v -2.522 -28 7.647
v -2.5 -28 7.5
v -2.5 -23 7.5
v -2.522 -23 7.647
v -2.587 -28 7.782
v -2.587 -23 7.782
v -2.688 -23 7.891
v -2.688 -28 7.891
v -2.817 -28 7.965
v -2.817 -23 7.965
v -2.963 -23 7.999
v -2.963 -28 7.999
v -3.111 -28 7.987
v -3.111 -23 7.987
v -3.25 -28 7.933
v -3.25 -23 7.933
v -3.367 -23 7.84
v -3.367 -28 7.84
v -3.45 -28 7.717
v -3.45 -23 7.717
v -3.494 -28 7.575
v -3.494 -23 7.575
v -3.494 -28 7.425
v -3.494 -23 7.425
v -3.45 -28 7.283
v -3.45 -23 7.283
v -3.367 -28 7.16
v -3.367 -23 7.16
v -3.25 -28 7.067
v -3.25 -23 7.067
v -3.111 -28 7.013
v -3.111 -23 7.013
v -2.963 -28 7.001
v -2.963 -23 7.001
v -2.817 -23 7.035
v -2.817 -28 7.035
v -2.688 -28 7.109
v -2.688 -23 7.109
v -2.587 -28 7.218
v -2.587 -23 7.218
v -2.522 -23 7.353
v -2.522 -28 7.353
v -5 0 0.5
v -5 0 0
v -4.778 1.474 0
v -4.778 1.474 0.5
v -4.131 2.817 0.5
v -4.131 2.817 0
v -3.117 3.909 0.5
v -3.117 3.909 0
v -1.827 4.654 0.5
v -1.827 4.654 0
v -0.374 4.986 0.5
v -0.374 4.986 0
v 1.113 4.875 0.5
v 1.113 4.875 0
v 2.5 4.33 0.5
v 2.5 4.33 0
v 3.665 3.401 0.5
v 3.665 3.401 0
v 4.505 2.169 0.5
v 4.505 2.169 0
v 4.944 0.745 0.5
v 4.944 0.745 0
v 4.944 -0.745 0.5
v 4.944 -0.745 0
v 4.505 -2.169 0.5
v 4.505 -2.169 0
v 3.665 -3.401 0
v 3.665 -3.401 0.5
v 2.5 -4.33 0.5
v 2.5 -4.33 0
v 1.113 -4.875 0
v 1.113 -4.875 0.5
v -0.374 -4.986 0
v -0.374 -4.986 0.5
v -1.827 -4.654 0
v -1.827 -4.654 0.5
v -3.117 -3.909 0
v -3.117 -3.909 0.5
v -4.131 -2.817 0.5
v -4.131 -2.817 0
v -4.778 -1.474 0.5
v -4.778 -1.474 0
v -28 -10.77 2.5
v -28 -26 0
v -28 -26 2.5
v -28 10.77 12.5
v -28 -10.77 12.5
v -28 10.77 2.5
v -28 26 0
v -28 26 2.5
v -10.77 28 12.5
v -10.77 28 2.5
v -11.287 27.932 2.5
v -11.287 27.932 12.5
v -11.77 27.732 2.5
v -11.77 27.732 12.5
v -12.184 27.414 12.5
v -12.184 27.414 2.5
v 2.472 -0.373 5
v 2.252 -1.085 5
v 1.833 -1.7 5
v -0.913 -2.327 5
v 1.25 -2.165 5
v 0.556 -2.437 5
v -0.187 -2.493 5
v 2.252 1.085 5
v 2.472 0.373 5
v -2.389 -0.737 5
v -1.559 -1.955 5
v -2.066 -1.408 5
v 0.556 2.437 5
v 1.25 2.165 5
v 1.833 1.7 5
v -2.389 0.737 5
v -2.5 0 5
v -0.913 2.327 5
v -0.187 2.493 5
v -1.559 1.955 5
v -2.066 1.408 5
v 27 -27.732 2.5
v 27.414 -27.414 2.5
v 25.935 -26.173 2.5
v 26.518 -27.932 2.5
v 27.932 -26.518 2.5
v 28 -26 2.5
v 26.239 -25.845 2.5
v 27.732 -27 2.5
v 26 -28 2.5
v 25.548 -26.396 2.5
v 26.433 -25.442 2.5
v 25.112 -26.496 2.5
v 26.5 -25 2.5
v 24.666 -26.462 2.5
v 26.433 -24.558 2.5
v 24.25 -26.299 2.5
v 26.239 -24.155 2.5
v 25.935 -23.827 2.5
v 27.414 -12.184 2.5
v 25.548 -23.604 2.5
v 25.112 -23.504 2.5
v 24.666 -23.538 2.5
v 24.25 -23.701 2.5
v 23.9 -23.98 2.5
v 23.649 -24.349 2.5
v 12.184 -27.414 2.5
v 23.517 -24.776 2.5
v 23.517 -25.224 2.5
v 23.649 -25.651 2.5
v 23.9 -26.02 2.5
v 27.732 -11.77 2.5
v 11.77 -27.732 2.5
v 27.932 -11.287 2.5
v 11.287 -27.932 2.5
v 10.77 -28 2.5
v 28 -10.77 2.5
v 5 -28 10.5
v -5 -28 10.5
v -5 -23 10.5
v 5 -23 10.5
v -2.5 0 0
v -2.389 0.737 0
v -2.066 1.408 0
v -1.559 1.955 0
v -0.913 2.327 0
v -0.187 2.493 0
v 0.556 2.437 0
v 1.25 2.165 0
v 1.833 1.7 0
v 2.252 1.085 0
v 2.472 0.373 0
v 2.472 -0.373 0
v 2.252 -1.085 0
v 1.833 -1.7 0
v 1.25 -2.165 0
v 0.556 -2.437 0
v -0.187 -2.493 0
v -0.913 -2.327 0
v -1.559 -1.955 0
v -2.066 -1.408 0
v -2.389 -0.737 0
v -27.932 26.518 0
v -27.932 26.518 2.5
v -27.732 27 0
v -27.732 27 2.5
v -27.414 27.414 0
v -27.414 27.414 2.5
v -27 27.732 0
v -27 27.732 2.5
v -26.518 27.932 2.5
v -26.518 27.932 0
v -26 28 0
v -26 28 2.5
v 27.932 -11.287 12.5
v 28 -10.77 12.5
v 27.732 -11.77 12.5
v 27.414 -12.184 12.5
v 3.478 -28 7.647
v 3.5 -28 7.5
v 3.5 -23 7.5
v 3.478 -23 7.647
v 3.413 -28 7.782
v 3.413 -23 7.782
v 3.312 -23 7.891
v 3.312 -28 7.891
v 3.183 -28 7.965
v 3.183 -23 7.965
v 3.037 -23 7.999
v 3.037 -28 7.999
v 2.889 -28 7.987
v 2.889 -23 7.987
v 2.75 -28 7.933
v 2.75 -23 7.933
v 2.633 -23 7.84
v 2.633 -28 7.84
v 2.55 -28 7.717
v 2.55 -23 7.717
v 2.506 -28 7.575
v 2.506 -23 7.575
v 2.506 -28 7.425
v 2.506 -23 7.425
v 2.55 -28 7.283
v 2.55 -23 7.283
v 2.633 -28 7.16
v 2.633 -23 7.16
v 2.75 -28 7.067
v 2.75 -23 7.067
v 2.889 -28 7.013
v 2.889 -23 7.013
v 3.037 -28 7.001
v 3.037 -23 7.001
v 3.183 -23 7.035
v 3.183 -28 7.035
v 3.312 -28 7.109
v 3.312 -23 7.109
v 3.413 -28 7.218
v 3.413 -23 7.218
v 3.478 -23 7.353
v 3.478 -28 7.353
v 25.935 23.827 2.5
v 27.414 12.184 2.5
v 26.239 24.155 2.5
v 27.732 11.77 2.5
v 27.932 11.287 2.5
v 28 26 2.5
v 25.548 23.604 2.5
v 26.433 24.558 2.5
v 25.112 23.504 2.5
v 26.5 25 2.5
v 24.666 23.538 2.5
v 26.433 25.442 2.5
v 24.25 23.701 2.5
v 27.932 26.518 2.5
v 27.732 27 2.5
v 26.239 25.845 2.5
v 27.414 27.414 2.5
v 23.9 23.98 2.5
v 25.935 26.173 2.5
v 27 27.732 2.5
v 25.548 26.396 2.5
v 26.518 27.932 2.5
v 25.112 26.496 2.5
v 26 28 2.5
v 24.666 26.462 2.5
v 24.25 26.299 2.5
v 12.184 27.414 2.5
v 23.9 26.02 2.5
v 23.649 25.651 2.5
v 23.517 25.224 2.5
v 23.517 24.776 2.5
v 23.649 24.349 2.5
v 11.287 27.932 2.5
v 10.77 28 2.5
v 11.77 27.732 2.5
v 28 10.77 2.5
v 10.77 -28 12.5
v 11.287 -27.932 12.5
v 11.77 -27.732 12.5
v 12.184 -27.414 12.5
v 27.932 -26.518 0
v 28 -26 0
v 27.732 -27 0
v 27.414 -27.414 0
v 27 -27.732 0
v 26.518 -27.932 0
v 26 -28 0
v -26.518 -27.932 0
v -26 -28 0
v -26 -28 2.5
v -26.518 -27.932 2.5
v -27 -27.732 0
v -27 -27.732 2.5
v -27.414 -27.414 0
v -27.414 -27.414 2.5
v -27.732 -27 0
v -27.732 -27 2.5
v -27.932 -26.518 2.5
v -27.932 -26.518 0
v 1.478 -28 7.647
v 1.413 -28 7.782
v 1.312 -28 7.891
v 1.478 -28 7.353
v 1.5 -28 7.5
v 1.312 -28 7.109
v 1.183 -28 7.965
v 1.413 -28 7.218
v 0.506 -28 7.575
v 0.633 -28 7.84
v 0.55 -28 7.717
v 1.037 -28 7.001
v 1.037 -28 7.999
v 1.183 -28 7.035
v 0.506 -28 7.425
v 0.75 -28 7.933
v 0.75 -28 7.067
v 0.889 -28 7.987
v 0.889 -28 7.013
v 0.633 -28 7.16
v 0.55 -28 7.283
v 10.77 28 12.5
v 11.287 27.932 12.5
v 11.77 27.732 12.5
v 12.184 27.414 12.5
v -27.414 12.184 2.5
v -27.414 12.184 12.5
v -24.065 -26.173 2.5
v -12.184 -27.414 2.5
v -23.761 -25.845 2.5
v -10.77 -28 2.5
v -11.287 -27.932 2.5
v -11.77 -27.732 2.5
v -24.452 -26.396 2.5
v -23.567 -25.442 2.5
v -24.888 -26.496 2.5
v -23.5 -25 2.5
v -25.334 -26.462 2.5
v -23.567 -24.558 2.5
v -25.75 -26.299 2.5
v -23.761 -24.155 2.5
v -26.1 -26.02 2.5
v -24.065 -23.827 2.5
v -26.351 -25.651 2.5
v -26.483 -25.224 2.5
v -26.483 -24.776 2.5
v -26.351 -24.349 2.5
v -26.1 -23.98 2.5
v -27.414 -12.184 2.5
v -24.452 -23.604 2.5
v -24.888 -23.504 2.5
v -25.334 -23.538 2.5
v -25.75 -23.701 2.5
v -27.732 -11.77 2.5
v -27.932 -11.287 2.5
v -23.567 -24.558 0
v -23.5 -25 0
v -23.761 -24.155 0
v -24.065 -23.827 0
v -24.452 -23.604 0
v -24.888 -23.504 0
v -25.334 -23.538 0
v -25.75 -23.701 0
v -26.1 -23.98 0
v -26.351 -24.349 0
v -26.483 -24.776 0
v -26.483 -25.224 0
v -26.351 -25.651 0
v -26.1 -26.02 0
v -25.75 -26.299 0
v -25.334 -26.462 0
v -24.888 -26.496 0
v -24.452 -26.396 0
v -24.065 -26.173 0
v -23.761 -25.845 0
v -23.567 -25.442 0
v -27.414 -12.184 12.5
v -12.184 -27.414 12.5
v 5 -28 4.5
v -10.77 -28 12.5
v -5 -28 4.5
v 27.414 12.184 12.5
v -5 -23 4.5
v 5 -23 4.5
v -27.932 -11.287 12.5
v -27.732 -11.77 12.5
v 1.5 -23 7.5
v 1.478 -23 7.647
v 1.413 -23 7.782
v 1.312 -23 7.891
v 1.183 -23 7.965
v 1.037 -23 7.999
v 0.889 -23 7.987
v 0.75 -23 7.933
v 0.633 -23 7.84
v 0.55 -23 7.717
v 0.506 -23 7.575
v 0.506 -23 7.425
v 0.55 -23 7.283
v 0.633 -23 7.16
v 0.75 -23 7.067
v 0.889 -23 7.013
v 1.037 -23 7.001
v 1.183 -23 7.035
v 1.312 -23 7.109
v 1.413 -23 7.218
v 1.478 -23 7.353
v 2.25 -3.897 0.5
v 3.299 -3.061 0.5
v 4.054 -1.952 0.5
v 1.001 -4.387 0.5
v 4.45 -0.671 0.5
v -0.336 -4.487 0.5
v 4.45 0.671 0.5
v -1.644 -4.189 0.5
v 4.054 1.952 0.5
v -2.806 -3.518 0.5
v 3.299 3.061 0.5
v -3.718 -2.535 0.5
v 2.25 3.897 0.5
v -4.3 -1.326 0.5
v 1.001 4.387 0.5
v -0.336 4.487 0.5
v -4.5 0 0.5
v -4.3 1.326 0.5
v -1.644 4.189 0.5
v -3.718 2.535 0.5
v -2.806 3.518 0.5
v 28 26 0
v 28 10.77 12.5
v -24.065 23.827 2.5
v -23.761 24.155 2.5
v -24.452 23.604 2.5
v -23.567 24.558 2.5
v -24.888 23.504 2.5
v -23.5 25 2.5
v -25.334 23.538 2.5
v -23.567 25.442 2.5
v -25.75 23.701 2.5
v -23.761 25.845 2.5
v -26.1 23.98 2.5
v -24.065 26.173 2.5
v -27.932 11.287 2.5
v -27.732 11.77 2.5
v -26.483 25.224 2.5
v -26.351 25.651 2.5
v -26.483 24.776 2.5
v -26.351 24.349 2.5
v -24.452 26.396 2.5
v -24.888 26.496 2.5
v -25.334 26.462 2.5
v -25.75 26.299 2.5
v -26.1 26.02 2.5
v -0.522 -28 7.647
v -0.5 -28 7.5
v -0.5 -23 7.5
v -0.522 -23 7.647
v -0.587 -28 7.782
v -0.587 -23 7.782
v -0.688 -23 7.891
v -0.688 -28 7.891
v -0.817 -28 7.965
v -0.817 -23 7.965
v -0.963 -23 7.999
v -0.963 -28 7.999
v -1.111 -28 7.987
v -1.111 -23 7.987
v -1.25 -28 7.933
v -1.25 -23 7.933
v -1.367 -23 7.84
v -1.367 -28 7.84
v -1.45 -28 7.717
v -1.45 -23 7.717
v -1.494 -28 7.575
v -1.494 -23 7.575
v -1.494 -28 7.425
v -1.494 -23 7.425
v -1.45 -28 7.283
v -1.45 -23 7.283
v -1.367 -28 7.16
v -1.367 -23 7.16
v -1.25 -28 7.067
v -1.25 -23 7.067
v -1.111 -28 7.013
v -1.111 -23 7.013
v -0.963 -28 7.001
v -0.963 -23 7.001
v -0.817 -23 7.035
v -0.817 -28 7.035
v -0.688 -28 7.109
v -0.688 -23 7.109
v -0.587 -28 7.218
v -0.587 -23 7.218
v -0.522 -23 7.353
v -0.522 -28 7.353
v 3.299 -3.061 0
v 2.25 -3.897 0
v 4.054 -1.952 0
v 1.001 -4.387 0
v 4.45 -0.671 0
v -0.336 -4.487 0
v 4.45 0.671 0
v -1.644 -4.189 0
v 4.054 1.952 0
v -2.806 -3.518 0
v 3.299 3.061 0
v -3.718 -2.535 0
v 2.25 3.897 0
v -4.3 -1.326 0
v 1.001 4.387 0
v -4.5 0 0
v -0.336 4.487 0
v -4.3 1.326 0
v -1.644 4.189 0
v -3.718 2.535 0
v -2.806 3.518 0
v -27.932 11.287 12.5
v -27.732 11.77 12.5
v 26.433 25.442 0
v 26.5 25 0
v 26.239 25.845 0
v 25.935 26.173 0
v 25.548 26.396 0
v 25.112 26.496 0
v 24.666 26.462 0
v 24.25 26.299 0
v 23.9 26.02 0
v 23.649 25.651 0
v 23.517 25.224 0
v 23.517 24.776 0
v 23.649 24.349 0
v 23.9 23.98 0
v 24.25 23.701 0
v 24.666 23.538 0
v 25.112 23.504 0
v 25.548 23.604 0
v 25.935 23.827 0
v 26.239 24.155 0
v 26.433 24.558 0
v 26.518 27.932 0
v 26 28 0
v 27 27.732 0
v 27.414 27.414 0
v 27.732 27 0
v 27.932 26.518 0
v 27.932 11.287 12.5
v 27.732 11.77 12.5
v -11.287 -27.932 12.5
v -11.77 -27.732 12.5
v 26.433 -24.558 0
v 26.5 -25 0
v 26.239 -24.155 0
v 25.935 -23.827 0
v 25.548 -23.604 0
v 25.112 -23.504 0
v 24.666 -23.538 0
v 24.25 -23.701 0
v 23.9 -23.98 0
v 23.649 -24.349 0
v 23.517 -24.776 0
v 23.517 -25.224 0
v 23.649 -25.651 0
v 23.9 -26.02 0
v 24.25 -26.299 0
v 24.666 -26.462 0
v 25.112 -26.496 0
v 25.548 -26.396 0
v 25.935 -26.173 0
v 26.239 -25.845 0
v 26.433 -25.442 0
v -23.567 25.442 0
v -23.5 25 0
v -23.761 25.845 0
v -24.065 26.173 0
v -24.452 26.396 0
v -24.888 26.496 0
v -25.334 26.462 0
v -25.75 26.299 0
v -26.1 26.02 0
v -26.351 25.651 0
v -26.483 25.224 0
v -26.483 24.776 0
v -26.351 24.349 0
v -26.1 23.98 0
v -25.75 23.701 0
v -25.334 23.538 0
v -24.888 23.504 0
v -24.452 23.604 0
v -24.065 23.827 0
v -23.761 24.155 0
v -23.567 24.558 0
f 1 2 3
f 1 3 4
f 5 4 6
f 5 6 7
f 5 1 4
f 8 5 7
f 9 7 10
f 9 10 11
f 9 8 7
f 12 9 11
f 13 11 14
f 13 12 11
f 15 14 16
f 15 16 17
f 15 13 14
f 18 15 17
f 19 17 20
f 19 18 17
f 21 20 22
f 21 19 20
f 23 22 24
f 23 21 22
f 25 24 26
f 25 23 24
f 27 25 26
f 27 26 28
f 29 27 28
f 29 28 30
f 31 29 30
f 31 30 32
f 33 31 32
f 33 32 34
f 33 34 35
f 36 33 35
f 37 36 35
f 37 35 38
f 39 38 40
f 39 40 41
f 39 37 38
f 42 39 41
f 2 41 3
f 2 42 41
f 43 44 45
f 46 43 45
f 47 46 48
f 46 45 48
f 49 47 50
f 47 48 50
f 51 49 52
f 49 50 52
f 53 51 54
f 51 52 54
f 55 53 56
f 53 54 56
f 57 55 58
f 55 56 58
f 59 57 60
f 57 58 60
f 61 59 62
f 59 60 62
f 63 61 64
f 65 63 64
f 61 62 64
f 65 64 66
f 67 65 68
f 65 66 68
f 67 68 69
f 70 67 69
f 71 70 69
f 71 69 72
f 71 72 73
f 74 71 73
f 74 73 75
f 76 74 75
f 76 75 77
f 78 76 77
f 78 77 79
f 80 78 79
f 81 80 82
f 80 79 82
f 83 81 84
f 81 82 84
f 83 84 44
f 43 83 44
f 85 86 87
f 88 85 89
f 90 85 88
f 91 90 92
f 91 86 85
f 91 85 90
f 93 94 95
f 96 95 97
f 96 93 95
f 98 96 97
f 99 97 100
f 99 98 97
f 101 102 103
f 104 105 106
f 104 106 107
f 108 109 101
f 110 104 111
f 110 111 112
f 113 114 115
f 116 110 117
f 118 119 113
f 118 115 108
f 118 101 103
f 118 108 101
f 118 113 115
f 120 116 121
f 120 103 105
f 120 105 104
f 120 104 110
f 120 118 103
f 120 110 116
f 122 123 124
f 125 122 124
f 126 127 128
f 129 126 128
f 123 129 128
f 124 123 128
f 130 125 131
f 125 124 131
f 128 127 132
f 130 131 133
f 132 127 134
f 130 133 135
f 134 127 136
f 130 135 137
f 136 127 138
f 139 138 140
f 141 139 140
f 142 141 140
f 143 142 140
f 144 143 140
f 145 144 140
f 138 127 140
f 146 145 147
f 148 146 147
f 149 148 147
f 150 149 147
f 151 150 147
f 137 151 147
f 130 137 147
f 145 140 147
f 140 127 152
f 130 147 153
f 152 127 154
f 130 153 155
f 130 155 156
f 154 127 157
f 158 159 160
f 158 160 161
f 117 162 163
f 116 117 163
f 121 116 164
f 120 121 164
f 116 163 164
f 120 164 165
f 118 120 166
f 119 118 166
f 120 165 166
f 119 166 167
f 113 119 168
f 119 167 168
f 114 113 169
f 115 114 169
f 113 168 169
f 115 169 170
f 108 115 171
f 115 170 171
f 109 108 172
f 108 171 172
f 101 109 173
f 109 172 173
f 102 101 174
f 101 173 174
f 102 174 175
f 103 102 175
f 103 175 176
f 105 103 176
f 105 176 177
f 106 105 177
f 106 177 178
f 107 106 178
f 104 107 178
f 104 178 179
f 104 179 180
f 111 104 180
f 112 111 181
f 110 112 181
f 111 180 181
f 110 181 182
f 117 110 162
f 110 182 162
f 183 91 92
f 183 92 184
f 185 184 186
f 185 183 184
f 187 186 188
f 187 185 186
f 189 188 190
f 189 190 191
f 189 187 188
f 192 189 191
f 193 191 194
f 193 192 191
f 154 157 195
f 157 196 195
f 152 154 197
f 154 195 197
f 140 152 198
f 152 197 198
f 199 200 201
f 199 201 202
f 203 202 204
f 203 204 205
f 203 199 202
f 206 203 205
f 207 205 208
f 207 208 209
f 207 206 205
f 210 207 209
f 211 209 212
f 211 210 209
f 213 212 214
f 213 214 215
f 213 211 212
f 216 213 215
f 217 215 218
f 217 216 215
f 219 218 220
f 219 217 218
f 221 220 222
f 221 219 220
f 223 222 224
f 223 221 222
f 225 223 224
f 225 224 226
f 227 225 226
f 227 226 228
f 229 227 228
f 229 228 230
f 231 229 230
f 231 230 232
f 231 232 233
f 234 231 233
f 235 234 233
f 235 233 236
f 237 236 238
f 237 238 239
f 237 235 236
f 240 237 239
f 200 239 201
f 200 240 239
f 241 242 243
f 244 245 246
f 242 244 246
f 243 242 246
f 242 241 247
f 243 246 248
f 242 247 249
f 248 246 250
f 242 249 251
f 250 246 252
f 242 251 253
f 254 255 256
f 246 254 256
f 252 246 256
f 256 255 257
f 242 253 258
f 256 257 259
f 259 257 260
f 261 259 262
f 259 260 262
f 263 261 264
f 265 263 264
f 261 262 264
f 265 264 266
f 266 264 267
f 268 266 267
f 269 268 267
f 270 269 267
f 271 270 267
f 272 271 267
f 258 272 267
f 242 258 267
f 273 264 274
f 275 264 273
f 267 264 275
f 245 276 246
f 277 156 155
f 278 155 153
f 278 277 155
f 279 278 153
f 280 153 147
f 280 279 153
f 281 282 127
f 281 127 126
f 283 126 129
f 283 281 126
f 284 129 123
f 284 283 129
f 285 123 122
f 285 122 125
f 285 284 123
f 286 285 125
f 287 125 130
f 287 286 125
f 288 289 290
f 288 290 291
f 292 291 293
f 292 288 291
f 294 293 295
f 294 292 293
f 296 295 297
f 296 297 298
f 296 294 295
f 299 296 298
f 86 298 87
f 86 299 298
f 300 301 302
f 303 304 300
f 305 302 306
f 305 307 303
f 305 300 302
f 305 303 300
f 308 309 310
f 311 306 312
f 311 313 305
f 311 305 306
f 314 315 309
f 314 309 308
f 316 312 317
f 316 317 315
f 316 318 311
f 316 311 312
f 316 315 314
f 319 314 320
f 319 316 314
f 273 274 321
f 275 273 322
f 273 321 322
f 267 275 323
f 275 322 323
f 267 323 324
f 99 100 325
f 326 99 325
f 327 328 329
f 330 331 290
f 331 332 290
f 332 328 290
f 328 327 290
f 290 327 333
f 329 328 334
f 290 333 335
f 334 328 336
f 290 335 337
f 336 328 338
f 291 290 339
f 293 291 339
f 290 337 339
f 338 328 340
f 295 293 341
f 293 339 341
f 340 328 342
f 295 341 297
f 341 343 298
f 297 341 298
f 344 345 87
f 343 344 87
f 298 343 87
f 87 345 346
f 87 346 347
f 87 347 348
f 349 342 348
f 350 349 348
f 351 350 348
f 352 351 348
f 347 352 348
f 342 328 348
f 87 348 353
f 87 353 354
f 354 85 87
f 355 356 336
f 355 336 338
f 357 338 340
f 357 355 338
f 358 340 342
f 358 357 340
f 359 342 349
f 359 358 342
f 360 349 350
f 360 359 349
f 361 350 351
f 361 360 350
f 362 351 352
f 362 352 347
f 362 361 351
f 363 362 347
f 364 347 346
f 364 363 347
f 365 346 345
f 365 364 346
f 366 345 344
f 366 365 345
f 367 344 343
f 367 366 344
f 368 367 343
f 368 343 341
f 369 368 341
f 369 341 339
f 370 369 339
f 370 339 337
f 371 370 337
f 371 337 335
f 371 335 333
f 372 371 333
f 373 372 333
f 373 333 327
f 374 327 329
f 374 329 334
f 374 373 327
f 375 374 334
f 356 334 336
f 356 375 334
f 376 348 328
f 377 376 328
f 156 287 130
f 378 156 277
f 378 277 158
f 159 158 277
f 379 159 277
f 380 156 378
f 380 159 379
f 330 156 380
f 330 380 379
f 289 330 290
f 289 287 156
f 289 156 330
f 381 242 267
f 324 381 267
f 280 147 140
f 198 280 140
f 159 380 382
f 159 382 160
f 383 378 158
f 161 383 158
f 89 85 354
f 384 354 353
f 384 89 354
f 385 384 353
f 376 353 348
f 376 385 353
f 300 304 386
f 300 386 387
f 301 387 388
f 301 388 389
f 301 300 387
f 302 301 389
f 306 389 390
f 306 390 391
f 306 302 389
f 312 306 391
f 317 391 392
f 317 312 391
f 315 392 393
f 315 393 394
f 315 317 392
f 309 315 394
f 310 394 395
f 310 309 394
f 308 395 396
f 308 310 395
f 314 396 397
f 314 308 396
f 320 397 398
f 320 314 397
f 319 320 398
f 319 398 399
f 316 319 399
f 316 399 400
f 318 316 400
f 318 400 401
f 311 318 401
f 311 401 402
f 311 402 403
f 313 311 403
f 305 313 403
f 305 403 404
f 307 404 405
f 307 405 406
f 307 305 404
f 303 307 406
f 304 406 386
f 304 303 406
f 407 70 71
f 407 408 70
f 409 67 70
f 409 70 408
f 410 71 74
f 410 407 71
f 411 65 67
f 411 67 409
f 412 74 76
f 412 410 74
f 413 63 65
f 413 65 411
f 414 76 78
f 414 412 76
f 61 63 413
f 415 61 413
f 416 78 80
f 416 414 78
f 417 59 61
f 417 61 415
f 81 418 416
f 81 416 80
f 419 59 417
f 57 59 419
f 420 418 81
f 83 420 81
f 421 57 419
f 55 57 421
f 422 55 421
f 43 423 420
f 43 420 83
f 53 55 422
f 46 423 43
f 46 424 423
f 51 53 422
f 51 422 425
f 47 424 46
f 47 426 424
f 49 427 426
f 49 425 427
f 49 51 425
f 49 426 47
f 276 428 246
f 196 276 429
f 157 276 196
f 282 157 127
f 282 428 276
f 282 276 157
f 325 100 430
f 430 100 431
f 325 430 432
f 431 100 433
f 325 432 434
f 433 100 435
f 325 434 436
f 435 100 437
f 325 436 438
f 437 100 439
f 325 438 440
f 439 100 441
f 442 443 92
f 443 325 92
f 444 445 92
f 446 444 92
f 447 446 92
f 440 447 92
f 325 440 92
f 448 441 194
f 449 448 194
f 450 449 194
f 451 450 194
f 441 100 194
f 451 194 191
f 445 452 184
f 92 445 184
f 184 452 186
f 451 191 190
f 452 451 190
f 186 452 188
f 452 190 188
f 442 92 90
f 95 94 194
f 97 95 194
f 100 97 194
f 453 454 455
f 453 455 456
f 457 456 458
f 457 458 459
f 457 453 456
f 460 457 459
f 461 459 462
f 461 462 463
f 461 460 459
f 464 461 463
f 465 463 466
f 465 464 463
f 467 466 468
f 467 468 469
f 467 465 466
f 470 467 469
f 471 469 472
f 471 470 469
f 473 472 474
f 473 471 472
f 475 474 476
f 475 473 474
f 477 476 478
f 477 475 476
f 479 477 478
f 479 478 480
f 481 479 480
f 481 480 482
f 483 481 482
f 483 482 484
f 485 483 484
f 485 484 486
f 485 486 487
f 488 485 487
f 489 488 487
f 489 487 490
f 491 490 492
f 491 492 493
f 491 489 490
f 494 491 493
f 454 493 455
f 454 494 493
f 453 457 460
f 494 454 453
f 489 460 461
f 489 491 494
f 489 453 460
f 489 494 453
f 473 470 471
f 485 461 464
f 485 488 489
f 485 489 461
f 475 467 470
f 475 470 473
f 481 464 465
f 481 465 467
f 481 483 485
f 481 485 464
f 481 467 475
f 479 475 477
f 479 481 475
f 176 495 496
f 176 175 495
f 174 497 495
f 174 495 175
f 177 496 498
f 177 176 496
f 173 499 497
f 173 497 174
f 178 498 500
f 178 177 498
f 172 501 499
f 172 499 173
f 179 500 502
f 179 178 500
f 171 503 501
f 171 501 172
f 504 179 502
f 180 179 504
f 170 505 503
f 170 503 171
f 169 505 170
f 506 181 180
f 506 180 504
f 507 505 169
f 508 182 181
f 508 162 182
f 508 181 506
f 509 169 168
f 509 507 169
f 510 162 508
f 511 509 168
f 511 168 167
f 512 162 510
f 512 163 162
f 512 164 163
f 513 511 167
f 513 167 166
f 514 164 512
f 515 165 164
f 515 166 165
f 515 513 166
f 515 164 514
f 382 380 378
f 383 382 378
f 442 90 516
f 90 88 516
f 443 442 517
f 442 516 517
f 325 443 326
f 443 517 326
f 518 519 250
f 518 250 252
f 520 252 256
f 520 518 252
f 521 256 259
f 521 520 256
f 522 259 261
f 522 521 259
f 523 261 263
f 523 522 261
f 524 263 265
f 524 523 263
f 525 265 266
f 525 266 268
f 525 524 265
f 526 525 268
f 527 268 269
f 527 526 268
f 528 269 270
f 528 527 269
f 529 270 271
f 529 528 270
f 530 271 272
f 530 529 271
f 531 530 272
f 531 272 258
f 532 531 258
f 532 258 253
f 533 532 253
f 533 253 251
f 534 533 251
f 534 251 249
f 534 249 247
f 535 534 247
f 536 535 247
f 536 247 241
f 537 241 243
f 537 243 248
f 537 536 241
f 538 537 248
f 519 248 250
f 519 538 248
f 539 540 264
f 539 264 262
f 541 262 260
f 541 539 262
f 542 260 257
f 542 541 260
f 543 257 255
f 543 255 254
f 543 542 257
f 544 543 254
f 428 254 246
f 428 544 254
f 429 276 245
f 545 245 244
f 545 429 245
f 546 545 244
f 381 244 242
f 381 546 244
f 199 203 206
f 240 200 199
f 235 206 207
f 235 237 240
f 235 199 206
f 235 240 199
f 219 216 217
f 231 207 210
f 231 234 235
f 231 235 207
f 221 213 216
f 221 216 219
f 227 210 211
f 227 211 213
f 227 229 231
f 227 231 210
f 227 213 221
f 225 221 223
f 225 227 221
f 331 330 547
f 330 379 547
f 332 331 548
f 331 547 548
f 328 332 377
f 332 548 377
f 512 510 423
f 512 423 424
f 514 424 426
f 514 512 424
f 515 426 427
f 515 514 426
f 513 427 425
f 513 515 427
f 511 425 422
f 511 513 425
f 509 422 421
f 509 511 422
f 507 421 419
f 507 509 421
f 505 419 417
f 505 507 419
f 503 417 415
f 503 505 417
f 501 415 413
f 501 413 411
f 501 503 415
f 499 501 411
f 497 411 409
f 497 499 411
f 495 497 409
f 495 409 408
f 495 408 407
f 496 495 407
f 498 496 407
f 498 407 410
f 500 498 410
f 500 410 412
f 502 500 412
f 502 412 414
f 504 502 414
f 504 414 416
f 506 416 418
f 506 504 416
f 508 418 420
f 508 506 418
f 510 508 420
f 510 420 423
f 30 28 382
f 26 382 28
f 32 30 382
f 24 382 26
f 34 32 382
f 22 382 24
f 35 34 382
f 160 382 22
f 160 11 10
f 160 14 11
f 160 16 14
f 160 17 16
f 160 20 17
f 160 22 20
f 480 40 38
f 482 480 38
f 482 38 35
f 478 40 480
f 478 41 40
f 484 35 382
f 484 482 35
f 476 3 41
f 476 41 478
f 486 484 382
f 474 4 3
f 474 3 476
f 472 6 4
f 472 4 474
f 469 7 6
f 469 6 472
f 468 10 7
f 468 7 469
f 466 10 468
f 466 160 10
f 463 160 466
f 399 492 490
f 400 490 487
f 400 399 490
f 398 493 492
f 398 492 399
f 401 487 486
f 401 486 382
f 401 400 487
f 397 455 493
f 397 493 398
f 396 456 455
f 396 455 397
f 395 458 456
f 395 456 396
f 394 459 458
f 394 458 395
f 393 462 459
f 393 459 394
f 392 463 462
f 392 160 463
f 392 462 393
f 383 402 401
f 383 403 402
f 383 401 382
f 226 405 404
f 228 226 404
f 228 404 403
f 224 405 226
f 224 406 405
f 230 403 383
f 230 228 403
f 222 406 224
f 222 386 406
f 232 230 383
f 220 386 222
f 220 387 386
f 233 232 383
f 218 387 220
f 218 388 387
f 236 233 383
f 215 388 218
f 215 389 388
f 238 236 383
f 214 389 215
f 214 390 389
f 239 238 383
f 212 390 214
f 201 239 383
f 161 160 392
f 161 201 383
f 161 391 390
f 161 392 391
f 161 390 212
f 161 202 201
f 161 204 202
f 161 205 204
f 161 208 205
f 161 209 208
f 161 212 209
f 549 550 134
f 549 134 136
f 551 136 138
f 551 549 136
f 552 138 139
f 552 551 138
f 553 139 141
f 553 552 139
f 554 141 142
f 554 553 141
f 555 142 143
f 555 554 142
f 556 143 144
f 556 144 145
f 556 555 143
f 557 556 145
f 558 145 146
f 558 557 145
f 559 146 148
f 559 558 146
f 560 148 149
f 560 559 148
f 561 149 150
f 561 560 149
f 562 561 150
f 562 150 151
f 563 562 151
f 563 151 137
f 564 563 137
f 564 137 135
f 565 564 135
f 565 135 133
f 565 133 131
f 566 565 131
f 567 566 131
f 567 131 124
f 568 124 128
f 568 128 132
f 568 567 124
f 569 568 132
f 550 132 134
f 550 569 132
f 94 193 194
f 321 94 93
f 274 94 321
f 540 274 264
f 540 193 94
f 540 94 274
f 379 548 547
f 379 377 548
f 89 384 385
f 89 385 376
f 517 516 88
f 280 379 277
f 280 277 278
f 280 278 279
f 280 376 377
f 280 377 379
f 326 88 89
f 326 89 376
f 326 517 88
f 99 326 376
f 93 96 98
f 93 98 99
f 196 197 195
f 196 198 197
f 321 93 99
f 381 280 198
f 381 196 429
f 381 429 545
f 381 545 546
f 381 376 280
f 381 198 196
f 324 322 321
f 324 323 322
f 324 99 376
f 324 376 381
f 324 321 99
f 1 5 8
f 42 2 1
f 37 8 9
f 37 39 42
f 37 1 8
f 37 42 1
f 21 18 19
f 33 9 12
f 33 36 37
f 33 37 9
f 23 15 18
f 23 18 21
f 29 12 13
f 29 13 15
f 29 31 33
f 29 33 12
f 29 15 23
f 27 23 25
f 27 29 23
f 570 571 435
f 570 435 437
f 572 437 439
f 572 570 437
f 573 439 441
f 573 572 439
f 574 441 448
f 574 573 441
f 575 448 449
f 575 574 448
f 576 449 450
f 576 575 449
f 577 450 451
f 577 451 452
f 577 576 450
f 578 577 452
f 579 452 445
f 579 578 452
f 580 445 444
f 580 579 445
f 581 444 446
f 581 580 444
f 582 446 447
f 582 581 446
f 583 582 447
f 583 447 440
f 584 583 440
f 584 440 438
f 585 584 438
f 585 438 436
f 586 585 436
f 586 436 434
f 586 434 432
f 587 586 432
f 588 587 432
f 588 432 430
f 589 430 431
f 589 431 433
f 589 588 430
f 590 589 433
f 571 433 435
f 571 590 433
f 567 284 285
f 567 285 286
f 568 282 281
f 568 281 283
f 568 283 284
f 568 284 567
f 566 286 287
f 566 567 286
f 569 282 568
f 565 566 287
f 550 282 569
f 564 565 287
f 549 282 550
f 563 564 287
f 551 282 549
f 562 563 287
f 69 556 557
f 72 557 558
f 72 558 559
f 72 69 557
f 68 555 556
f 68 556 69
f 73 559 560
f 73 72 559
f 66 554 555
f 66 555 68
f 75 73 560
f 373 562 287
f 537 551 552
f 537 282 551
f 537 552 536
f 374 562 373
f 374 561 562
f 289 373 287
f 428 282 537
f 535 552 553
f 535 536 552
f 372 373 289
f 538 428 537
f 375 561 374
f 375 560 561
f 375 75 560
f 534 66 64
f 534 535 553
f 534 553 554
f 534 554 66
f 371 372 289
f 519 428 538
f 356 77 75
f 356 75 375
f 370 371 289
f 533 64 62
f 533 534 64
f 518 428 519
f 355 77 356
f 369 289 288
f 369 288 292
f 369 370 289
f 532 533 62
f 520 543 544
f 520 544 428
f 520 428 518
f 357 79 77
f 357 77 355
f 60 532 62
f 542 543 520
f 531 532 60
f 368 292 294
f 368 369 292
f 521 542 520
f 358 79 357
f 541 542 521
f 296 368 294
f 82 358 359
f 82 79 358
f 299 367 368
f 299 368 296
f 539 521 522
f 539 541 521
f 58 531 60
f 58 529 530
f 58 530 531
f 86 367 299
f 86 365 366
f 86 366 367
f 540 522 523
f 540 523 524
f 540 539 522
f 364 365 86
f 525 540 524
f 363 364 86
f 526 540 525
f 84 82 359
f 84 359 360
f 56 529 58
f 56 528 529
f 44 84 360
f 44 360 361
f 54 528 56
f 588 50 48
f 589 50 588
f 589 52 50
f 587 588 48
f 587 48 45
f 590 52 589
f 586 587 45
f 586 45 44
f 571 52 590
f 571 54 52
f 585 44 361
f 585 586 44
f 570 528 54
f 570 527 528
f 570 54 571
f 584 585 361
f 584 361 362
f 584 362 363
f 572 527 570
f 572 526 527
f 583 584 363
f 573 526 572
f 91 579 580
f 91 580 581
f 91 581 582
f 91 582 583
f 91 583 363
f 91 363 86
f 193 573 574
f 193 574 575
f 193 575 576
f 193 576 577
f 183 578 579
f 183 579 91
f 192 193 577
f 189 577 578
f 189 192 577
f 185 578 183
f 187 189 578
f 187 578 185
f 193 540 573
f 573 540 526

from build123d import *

# Parameters (mm, degrees)
SKETCH1_R           = 1.5
BOSS_EXTRUDE1_DEPTH = 2.5
BOSS_EXTRUDE2_DEPTH = 10
FILLET1_R           = 2
SKETCH3_R           = 2.5
CUT_EXTRUDE1_DEPTH  = 5
SKETCH4_R           = 5
SKETCH4_R_2         = 4.5
CUT_EXTRUDE2_DEPTH  = 0.5
SKETCH5_W           = 10
SKETCH5_H           = 6
SKETCH5_R           = 0.5
CUT_EXTRUDE3_DEPTH  = 5


with BuildPart() as part:
    # Sketch1 → Boss-Extrude1 (new body)
    with BuildSketch(Plane.XY):
        with BuildLine():
            Line((-26, 28), (26, 28))
            ThreePointArc((26, 28), (27.414213562, 27.414213562), (28, 26))
            Line((28, 26), (28, -26))
            ThreePointArc((28, -26), (27.414213562, -27.414213562), (26, -28))
            Line((26, -28), (-26, -28))
            ThreePointArc((-26, -28), (-27.414213562, -27.414213562), (-28, -26))
            Line((-28, -26), (-28, 26))
            ThreePointArc((-28, 26), (-27.414213562, 27.414213562), (-26, 28))
        make_face()
        with Locations((-25, 25)):
            Circle(SKETCH1_R, mode=Mode.SUBTRACT)
        with Locations((25, 25)):
            Circle(SKETCH1_R, mode=Mode.SUBTRACT)
        with Locations((25, -25)):
            Circle(SKETCH1_R, mode=Mode.SUBTRACT)
        with Locations((-25, -25)):
            Circle(SKETCH1_R, mode=Mode.SUBTRACT)
    extrude(amount=BOSS_EXTRUDE1_DEPTH)

    # Sketch2 → Boss-Extrude2 (add)
    with BuildSketch(Plane.XY.offset(2.5)):
        Polygon((-11.597979746, -28), (11.597979746, -28), (28, -11.597979746), (28, 11.597979746), (11.597979746, 28), (-11.597979746, 28), (-28, 11.597979746), (-28, -11.597979746), align=None)
    extrude(amount=BOSS_EXTRUDE2_DEPTH)

    # Fillet1
    fillet1_edges = [part.edges().sort_by_distance(p)[0] for p in [
        (11.597979746, -28, 7.5),
        (28, -11.597979746, 7.5),
        (28, 11.597979746, 7.5),
        (11.597979746, 28, 7.5),
        (-11.597979746, 28, 7.5),
        (-28, 11.597979746, 7.5),
        (-28, -11.597979746, 7.5),
        (-11.597979746, -28, 7.5),
    ]]
    fillet(fillet1_edges, radius=FILLET1_R)

    # Sketch3 → Cut-Extrude1 (cut)
    with BuildSketch(Plane(origin=(0, 0, 0), x_dir=(-1, 0, 0), z_dir=(0, 0, -1))):
        Circle(SKETCH3_R)
    extrude(amount=-CUT_EXTRUDE1_DEPTH, mode=Mode.SUBTRACT)

    # Sketch4 → Cut-Extrude2 (cut)
    with BuildSketch(Plane(origin=(0, 0, 0), x_dir=(-1, 0, 0), z_dir=(0, 0, -1))):
        Circle(SKETCH4_R)
        Circle(SKETCH4_R_2, mode=Mode.SUBTRACT)
    extrude(amount=-CUT_EXTRUDE2_DEPTH, mode=Mode.SUBTRACT)

    # Sketch5 → Cut-Extrude3 (cut)
    with BuildSketch(Plane.XZ.offset(28)):
        with Locations((0, 7.5)):
            Rectangle(SKETCH5_W, SKETCH5_H)
        with Locations((-3, 7.5)):
            Circle(SKETCH5_R, mode=Mode.SUBTRACT)
        with Locations((-1, 7.5)):
            Circle(SKETCH5_R, mode=Mode.SUBTRACT)
        with Locations((1, 7.5)):
            Circle(SKETCH5_R, mode=Mode.SUBTRACT)
        with Locations((3, 7.5)):
            Circle(SKETCH5_R, mode=Mode.SUBTRACT)
    extrude(amount=-CUT_EXTRUDE3_DEPTH, mode=Mode.SUBTRACT)


solid = part.part
